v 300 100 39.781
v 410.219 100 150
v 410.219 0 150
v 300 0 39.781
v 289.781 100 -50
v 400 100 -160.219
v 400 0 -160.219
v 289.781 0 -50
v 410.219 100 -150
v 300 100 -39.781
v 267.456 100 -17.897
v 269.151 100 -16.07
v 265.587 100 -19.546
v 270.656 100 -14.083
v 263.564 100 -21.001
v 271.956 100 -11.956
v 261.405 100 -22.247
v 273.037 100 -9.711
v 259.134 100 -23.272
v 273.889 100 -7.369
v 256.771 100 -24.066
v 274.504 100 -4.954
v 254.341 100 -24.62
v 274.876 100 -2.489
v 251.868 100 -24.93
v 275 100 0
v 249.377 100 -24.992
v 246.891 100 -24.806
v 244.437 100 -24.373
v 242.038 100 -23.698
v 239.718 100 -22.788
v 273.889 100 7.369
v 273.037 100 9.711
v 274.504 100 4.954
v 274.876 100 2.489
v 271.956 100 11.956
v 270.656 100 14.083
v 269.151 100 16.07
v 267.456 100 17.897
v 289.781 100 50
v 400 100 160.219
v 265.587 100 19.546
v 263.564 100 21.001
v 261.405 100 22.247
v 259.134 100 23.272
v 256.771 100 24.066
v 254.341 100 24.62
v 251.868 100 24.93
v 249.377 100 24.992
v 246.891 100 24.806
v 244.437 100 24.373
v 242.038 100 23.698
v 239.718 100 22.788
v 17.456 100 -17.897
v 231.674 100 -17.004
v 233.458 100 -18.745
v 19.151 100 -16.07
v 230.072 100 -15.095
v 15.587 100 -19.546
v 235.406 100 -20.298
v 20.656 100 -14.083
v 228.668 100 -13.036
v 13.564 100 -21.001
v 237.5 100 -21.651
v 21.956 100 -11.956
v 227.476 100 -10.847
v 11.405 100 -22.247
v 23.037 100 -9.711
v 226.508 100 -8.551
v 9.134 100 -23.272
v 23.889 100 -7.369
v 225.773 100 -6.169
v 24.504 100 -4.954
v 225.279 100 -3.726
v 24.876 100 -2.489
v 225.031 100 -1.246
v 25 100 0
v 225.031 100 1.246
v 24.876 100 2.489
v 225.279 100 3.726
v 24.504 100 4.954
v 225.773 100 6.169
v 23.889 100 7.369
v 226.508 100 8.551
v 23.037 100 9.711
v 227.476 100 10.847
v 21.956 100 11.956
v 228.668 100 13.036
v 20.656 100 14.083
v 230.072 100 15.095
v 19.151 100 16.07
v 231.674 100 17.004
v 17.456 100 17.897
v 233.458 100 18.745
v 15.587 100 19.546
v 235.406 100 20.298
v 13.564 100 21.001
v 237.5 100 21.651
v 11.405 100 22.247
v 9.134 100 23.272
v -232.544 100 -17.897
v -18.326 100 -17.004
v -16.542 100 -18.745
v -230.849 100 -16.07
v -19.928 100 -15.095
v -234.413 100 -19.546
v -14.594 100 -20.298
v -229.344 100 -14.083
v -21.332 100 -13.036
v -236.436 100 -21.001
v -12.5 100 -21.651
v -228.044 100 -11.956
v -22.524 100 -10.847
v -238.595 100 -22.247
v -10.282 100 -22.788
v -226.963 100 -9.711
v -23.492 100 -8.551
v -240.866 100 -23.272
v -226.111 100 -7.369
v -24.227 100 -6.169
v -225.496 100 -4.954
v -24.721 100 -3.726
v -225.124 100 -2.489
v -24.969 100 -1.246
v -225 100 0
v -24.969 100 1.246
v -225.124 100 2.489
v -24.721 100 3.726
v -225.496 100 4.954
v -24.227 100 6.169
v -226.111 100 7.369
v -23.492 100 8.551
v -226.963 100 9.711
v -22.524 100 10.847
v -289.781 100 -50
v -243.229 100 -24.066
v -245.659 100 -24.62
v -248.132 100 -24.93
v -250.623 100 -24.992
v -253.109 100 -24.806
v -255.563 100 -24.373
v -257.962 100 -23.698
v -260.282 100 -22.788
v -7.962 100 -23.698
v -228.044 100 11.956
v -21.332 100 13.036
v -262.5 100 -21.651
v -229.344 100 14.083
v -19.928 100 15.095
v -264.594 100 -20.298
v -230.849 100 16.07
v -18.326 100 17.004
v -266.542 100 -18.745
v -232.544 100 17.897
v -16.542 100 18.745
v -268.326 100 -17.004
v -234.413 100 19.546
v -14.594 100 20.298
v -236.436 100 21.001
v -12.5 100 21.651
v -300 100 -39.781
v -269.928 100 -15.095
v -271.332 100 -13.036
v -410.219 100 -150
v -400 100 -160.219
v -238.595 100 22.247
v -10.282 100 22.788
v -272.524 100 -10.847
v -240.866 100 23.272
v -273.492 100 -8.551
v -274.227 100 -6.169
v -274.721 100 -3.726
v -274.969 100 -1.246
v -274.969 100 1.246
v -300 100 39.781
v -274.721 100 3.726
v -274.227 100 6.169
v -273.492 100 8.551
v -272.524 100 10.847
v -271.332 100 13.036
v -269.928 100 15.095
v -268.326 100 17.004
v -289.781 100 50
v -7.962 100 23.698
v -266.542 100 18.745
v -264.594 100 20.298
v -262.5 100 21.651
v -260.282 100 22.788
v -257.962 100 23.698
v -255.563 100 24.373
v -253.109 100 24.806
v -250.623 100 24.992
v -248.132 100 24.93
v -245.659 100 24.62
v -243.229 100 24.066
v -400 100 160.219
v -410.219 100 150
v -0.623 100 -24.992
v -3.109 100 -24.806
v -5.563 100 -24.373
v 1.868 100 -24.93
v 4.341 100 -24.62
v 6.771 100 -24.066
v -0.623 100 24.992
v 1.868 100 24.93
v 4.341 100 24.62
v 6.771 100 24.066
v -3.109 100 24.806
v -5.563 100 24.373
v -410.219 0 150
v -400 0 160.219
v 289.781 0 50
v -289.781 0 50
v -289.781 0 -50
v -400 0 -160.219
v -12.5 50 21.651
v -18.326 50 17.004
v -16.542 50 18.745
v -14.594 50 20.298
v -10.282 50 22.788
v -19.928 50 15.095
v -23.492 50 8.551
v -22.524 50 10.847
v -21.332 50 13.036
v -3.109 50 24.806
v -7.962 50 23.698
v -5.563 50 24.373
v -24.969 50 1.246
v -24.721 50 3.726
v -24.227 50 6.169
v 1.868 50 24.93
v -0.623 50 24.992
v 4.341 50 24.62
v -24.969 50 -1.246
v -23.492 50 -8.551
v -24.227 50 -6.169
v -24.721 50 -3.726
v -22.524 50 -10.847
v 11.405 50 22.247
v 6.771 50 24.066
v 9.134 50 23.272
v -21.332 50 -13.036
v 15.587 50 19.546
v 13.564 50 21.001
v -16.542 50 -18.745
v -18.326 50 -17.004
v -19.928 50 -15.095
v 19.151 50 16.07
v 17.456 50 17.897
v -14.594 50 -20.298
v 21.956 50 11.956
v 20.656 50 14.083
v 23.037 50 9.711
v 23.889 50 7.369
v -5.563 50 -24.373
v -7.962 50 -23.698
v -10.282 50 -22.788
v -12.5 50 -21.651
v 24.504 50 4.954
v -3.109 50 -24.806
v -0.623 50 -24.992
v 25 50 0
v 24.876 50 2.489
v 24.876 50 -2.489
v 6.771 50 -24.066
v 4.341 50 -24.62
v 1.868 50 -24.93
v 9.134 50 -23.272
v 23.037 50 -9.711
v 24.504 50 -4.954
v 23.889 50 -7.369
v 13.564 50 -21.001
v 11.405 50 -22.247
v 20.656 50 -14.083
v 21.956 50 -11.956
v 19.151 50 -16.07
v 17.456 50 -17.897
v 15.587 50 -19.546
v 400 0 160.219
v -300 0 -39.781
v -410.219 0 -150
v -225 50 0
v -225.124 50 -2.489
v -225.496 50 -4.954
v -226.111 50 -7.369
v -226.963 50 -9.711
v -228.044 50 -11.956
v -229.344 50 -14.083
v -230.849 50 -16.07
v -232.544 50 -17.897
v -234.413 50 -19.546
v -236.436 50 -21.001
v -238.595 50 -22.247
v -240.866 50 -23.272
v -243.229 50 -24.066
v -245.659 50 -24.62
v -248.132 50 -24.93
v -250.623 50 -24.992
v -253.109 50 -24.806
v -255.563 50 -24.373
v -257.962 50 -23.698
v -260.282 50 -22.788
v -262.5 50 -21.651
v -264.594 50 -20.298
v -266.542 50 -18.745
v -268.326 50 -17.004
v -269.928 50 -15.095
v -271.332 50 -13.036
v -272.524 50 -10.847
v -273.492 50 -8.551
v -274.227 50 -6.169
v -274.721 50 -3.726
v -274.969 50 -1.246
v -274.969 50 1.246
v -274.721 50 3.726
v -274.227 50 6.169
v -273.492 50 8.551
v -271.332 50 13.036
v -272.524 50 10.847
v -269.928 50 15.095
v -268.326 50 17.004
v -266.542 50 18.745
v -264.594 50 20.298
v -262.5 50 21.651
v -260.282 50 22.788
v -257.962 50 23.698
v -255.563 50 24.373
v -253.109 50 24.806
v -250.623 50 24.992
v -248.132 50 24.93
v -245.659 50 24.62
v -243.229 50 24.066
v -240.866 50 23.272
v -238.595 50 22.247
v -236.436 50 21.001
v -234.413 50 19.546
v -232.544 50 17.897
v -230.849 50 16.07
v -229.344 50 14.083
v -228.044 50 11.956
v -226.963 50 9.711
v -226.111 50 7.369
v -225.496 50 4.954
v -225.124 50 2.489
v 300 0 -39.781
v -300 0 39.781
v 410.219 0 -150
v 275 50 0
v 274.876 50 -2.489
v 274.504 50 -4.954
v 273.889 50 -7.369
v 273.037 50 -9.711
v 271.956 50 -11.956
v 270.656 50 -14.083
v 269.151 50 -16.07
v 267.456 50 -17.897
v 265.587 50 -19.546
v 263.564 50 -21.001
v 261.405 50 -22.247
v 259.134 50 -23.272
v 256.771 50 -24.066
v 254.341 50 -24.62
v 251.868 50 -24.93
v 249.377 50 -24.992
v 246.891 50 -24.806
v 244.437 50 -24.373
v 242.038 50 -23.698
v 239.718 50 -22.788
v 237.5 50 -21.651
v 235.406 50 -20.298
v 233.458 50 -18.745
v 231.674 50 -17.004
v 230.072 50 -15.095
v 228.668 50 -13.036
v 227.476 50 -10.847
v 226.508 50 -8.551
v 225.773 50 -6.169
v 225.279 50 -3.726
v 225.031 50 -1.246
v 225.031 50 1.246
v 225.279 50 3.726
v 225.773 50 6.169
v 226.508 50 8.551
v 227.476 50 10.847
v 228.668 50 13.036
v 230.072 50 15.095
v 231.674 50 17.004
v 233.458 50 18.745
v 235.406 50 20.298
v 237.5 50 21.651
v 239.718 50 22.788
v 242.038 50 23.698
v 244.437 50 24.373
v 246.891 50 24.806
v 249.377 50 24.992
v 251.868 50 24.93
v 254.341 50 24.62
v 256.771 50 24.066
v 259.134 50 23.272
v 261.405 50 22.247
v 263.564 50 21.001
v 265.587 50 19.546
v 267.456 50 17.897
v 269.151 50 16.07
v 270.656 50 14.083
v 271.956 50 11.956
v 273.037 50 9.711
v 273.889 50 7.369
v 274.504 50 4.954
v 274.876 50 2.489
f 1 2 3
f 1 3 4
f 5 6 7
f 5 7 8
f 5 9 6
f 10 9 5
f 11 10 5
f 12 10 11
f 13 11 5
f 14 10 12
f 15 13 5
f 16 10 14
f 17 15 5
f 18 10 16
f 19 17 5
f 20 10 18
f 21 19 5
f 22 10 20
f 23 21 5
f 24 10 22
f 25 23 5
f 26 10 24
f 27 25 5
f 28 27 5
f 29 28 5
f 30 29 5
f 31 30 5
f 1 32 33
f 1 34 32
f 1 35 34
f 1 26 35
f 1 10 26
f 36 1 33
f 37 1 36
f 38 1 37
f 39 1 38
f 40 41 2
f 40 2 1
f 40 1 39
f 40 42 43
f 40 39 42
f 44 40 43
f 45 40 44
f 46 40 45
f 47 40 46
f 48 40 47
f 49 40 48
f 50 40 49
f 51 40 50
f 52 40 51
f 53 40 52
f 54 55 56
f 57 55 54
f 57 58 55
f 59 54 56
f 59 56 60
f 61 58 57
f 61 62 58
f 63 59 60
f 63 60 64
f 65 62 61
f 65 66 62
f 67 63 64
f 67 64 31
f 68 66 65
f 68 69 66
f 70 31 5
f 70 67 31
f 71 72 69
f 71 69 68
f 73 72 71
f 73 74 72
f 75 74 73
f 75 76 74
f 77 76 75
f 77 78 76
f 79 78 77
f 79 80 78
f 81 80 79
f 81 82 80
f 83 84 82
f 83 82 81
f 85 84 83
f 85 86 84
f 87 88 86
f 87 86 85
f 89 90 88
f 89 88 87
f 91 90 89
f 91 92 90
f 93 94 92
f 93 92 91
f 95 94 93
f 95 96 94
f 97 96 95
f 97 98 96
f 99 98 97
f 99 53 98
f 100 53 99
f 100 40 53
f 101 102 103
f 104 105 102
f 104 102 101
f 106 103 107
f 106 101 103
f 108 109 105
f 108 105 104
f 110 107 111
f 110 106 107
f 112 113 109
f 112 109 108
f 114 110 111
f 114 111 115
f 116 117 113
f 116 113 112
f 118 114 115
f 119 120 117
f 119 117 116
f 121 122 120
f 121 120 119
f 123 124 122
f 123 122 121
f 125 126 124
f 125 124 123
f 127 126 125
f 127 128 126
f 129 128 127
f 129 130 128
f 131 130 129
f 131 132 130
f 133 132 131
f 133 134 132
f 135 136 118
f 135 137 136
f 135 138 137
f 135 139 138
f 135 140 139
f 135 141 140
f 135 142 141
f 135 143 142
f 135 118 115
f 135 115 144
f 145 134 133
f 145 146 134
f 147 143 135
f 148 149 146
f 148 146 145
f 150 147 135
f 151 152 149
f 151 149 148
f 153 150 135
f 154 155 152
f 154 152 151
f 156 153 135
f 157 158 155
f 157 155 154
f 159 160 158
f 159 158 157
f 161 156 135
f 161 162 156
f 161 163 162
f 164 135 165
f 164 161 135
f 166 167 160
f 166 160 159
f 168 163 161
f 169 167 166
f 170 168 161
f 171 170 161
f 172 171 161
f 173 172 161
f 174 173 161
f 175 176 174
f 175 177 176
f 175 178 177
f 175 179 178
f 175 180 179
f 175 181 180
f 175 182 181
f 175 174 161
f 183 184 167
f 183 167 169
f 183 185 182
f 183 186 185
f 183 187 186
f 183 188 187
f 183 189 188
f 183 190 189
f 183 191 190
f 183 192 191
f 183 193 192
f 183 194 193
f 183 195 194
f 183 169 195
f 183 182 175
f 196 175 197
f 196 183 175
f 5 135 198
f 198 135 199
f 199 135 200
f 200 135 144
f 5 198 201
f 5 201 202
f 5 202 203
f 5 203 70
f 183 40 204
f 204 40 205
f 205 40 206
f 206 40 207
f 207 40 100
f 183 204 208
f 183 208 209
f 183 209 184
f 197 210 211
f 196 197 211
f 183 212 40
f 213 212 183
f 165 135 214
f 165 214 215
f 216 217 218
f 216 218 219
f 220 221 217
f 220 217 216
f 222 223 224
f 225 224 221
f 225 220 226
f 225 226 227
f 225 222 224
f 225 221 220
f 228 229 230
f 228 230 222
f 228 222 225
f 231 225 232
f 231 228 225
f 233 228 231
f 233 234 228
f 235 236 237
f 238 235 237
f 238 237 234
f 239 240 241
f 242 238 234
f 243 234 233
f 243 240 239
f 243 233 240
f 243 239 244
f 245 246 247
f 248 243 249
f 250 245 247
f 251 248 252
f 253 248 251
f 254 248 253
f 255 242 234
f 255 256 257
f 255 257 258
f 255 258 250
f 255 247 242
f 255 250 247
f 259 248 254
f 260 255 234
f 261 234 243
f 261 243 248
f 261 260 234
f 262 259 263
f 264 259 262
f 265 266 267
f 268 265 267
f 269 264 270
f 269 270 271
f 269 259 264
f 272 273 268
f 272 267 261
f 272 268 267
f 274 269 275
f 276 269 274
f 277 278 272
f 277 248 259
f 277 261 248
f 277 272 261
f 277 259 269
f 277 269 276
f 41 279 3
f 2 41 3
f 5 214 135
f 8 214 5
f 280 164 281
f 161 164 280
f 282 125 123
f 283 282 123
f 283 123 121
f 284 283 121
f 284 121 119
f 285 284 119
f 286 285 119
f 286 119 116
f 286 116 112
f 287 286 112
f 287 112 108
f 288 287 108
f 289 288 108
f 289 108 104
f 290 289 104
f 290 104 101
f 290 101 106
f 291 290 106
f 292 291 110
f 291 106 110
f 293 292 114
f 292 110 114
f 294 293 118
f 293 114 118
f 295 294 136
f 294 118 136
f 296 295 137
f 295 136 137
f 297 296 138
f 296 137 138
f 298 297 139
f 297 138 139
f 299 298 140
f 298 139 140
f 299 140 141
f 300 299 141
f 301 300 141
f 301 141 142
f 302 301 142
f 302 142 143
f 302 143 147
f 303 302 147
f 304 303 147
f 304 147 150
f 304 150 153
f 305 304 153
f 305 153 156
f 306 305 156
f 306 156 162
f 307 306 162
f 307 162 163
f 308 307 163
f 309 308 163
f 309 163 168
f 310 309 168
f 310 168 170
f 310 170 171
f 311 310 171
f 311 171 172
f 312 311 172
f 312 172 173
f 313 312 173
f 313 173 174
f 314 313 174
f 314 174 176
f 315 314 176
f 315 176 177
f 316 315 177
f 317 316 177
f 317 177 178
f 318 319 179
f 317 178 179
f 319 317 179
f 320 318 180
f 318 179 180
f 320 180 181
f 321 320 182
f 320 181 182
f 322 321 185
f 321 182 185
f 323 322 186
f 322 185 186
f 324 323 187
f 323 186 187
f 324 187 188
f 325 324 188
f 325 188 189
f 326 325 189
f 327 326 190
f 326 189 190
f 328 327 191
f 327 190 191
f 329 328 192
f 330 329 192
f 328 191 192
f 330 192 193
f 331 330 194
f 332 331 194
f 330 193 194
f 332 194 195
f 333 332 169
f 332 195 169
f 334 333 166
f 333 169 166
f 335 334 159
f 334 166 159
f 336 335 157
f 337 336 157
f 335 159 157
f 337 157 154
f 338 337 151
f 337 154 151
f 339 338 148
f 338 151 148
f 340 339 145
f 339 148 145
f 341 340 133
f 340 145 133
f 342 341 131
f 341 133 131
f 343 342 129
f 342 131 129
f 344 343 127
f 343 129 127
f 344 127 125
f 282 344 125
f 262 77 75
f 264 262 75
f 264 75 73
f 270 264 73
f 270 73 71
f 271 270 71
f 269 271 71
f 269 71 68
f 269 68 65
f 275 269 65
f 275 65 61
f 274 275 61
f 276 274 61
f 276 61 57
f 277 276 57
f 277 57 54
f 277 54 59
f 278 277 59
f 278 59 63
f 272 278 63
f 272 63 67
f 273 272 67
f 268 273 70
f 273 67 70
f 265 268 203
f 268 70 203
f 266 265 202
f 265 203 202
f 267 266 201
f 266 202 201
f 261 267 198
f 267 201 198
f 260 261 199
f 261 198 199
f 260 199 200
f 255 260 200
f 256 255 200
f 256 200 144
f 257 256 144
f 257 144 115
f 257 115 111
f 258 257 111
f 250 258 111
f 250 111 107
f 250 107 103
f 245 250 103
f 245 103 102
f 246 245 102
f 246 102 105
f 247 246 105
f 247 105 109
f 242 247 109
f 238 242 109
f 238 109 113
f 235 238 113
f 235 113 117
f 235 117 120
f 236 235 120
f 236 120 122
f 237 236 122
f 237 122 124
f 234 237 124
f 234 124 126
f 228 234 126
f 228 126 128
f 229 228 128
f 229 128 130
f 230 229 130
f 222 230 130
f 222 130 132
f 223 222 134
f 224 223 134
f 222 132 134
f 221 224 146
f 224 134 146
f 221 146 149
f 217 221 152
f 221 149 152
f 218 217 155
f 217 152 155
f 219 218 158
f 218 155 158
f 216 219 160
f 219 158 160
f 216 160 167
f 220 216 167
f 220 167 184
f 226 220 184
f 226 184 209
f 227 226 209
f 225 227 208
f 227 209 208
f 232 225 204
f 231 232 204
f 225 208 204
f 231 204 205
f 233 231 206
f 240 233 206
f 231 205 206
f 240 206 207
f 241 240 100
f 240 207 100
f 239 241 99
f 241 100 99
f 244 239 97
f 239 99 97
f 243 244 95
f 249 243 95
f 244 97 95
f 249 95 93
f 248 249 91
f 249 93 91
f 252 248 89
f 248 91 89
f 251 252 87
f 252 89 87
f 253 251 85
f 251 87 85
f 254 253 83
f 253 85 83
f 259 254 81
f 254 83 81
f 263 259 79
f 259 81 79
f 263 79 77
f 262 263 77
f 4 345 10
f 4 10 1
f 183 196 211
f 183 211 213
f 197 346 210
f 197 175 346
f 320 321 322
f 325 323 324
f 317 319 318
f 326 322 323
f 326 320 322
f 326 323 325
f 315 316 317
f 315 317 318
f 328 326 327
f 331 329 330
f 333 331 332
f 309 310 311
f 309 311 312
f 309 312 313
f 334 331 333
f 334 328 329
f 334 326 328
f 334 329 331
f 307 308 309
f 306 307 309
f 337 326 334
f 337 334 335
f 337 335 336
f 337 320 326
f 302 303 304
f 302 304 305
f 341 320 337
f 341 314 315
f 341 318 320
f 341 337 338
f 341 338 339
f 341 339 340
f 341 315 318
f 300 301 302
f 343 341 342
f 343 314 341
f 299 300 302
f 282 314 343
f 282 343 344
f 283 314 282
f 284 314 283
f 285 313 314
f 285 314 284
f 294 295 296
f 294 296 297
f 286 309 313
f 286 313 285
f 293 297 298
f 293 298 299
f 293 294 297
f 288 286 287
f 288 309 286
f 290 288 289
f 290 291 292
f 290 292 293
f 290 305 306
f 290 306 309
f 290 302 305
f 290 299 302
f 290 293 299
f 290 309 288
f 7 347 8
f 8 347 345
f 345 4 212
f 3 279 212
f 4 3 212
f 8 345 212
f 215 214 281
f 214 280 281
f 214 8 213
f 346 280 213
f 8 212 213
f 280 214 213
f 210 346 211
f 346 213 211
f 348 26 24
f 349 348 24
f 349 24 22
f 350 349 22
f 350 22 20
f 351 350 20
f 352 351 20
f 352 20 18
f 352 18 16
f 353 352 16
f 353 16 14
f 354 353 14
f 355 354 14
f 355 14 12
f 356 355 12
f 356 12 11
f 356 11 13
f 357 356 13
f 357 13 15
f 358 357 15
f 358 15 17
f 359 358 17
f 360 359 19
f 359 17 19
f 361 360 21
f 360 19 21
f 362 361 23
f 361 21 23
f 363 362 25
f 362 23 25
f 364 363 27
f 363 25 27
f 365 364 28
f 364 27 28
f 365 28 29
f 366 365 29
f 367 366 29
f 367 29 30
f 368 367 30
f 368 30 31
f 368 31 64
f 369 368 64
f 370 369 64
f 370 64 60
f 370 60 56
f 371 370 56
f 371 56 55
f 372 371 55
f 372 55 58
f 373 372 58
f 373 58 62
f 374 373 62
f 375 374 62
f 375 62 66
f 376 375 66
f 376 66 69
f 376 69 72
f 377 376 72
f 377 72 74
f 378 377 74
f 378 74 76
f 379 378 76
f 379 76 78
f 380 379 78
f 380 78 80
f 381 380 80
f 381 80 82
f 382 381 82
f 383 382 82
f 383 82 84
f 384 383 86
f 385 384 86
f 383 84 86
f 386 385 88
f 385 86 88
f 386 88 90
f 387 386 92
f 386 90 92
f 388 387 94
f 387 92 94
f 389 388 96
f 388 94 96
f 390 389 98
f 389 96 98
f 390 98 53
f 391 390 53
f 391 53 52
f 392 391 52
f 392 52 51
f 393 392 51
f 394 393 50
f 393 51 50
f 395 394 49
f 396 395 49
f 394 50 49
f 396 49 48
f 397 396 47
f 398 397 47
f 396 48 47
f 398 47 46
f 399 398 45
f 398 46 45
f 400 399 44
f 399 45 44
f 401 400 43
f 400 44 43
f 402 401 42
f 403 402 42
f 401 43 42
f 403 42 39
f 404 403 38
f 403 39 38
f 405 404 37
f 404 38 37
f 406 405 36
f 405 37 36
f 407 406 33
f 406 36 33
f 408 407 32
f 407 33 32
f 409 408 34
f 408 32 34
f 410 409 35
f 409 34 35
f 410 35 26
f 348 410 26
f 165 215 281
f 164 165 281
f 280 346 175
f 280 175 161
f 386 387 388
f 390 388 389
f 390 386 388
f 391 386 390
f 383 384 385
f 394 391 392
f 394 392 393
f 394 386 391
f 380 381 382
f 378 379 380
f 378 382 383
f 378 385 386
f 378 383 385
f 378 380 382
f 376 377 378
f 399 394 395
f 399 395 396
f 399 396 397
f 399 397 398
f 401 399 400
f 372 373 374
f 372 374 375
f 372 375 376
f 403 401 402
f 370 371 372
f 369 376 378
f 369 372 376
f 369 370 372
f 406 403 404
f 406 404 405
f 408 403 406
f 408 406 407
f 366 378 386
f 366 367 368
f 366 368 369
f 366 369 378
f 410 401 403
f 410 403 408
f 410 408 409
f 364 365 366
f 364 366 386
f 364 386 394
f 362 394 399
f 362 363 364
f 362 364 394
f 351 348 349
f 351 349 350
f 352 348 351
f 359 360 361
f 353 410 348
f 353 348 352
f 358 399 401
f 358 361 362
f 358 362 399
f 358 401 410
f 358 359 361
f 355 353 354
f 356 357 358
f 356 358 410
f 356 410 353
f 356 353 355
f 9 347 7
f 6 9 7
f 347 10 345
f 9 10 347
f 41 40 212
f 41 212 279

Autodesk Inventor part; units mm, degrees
ref_plane "YZ Plane" through (0, 0, 0) normal (1, 0, 0) x (0, 1, 0)
ref_plane "XZ Plane" through (0, 0, 0) normal (0, 1, 0) x (-1, 0, 0)
ref_plane "XY Plane" through (0, 0, 0) normal (0, 0, 1) x (1, 0, 0)
sketch "Sketch1" plane through (0, 0, 0) normal (0, 1, 0) x (-1, 0, 0)
  line L0 (-300, 50) -> (300, 50)
  line L1 (300, 50) -> (300, -50)
  line L2 (300, -50) -> (-300, -50)
  line L3 (-300, -50) -> (-300, 50)
  line L4 (-300, 50) -> (300, -50) construction
  line L5 (300, 50) -> (-300, -50) construction
  point P0 (0, 0)
  dimension "d0" = 100
  dimension "d1" = 600
extrude "Extrusion1" add sketch "Sketch1" along normal blind 100
sketch "Sketch2" plane through (0, 100, 0) normal (0, 1, 0) x (1, 0, 0)
  line L0 (300, 50) -> (-300, 50) projected
  line L1 (-300, 50) -> (-400, 150) construction
  line L2 (-410.2193, 150) -> (-300, 39.7807)
  line L3 (-300, 39.7807) -> (-289.7807, 50)
  line L4 (-289.7807, 50) -> (-400, 160.2193)
  line L5 (-400, 160.2193) -> (-410.2193, 150)
  line L6 (-410.2193, 150) -> (-289.7807, 50) construction
  line L7 (-300, 39.7807) -> (-400, 160.2193) construction
  point P0 (0, 0)
  point P1 (-350, 100)
  dimension "d4" = 135
  dimension "d5" = 100
  dimension "d6" = 135
extrude "Extrusion2" add sketch "Sketch2" against normal up to surface (100 mm away)
mirror "Mirror1" about plane through (0, 0, 0) normal (1, 0, 0) of "Extrusion2"
mirror "Mirror2" about plane through (0, 0, 0) normal (0, 0, 1) of "Extrusion2", "Mirror1"
sketch "Sketch4" plane through (0, 100, 0) normal (0, 1, 0) x (1, 0, 0)
  circle A0 centre (0, 0) radius 25
  line L0 (-300, 39.7807) -> (-300, -39.7807) construction
  line L1 (-300, 0) -> (300, 0) construction
  line L2 (300, -39.7807) -> (300, 39.7807) construction
  circle A1 centre (250, 0) radius 25
  line L3 (-50, 0) -> (550, 0) construction
  circle A2 centre (-250, 0) radius 25
  line L4 (-550, 0) -> (50, 0) construction
  circle A3 centre (0, 0) radius 25
  line L5 (-300, 0) -> (300, 0) construction
  dimension "d9" = 50
  dimension "d12" = 250
  dimension "d15" = 250
extrude "Extrusion3" cut sketch "Sketch4" against normal blind 50
properties part number "rotational_platform"
